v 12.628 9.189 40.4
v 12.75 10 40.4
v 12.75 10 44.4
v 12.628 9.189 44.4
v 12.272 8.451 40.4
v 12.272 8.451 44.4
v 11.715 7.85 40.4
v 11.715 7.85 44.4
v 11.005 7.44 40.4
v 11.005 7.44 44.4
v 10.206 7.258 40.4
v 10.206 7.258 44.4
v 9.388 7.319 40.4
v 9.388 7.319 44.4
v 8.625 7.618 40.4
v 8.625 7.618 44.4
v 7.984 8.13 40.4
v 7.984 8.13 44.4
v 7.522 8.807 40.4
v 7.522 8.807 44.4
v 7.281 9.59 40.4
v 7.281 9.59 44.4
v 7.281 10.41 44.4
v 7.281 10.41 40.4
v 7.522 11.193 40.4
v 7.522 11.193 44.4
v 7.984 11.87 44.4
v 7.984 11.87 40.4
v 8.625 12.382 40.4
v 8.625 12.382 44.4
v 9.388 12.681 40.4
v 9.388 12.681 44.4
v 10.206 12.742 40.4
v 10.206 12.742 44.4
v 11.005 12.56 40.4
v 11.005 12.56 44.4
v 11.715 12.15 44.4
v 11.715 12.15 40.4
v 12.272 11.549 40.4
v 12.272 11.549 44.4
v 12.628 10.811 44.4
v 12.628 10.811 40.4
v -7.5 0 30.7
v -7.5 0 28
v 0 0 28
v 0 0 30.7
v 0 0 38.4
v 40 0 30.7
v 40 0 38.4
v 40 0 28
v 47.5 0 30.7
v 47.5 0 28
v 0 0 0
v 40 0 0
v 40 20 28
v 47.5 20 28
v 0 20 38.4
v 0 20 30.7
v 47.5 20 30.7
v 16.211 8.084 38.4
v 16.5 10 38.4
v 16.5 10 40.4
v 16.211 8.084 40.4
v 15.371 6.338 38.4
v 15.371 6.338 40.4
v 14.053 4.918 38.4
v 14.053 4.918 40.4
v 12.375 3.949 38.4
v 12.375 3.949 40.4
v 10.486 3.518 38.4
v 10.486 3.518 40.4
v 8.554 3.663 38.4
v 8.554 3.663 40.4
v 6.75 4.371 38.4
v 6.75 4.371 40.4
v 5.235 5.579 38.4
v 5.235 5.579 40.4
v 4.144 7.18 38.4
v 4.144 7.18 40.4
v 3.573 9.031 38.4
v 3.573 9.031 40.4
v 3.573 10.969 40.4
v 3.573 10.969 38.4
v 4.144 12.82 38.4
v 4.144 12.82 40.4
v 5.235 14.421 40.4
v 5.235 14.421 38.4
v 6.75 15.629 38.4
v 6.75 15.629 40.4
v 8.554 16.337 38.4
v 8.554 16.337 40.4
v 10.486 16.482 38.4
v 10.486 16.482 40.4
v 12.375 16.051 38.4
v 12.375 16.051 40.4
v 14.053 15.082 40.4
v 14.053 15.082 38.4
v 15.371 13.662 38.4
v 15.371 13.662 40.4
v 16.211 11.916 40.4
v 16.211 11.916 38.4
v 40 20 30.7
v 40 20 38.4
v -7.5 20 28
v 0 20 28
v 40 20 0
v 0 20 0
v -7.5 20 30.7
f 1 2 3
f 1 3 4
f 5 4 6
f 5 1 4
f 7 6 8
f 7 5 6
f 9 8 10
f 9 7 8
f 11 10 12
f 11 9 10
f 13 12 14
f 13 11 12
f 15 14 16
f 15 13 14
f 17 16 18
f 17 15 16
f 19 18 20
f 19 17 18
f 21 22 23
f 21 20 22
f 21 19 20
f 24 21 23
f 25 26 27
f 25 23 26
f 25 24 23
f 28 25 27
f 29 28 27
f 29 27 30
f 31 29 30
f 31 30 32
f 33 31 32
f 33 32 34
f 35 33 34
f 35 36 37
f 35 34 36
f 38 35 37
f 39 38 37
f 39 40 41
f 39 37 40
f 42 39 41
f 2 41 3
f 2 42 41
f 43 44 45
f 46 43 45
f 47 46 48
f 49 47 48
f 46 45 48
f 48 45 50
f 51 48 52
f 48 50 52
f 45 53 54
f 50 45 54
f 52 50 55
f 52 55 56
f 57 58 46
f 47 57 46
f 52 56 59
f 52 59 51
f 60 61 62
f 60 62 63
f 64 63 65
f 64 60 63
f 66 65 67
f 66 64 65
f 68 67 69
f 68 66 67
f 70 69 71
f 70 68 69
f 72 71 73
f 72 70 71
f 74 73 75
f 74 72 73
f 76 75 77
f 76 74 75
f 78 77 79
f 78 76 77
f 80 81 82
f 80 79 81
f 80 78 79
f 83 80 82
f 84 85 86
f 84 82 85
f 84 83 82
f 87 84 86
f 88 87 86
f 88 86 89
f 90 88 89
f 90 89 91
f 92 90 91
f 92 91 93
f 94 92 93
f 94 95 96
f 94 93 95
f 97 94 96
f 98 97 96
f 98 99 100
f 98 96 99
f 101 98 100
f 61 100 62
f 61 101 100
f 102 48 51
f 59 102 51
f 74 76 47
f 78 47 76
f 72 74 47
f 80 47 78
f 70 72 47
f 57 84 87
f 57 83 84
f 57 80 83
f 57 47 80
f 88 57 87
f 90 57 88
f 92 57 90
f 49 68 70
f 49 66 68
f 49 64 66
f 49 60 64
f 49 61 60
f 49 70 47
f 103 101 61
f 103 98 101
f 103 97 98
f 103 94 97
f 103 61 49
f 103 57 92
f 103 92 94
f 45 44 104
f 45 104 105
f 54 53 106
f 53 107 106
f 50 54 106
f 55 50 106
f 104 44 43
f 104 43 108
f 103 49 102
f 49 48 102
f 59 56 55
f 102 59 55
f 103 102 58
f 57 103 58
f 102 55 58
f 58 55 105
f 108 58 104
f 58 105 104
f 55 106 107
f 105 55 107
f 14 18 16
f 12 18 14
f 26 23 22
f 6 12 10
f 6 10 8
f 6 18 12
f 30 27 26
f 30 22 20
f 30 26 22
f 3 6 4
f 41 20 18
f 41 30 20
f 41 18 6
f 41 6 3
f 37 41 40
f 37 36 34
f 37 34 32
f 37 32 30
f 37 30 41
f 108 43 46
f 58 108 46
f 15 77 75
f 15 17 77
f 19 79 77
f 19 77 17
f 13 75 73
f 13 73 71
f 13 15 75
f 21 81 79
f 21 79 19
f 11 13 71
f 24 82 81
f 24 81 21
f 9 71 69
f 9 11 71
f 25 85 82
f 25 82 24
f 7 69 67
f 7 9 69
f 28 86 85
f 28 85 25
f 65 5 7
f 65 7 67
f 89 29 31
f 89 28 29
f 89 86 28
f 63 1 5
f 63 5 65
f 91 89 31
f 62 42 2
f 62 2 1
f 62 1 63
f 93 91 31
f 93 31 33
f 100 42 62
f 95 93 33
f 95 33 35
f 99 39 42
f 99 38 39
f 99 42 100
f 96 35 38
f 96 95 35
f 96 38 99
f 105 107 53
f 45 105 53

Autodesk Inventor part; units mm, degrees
ref_plane "YZ Plane" through (0, 0, 0) normal (1, 0, 0) x (0, 1, 0)
ref_plane "XZ Plane" through (0, 0, 0) normal (0, 1, 0) x (-1, 0, 0)
ref_plane "XY Plane" through (0, 0, 0) normal (0, 0, 1) x (1, 0, 0)
sketch "Boceto1" plane through (0, 0, 0) normal (0, 0, 1) x (1, 0, 0)
  line L0 (0, 0) -> (40, 0)
  line L1 (40, 0) -> (40, 20)
  line L2 (40, 20) -> (0, 20)
  line L3 (0, 20) -> (0, 0)
  dimension "d0" = 40
  dimension "d1" = 20
extrude "Extrusión1" add sketch "Boceto1" along normal blind 28
sketch "Boceto2" plane through (0, 0, 28) normal (0, 0, 1) x (1, 0, 0)
  line L0 (0, 0) -> (40, 0) projected
  line L1 (-7.5, 20) -> (47.5, 20)
  line L2 (47.5, 20) -> (47.5, 0)
  line L3 (47.5, 0) -> (-7.5, 0)
  line L4 (-7.5, 0) -> (-7.5, 20)
  point P0 (20, 0)
  point P1 (20, 0)
  dimension "d4" = 55
extrude "Extrusión2" add sketch "Boceto2" along normal blind 2.7
sketch "Boceto3" plane through (0, 0, 30.7) normal (0, 0, 1) x (1, 0, 0)
  line L0 (0, 0) -> (40, 0)
  line L1 (40, 0) -> (40, 20)
  line L2 (40, 20) -> (0, 20)
  line L3 (0, 20) -> (0, 0)
  dimension "d7" = 40
  dimension "d8" = 20
extrude "Extrusión3" add sketch "Boceto3" along normal blind 7.7
sketch "Boceto4" plane through (0, 0, 38.4) normal (0, 0, 1) x (1, 0, 0)
  line L0 (0, 20) -> (0, 0) projected
  circle A0 centre (10, 10) radius 6.5
  dimension "d11" = 13
  dimension "d12" = 10
extrude "Extrusión4" add sketch "Boceto4" along normal blind 2
sketch "Boceto5" plane through (10, 10, 40.4) normal (0, 0, 1) x (1, 0, 0)
  circle A0 centre (0, 0) radius 6.5 projected
  circle A1 centre (0, 0) radius 2.75
  point P0 (-10, -10)
  dimension "d15" = 5.5
extrude "Extrusión5" add sketch "Boceto5" along normal blind 4 contours A1
properties part number "Servo2"
